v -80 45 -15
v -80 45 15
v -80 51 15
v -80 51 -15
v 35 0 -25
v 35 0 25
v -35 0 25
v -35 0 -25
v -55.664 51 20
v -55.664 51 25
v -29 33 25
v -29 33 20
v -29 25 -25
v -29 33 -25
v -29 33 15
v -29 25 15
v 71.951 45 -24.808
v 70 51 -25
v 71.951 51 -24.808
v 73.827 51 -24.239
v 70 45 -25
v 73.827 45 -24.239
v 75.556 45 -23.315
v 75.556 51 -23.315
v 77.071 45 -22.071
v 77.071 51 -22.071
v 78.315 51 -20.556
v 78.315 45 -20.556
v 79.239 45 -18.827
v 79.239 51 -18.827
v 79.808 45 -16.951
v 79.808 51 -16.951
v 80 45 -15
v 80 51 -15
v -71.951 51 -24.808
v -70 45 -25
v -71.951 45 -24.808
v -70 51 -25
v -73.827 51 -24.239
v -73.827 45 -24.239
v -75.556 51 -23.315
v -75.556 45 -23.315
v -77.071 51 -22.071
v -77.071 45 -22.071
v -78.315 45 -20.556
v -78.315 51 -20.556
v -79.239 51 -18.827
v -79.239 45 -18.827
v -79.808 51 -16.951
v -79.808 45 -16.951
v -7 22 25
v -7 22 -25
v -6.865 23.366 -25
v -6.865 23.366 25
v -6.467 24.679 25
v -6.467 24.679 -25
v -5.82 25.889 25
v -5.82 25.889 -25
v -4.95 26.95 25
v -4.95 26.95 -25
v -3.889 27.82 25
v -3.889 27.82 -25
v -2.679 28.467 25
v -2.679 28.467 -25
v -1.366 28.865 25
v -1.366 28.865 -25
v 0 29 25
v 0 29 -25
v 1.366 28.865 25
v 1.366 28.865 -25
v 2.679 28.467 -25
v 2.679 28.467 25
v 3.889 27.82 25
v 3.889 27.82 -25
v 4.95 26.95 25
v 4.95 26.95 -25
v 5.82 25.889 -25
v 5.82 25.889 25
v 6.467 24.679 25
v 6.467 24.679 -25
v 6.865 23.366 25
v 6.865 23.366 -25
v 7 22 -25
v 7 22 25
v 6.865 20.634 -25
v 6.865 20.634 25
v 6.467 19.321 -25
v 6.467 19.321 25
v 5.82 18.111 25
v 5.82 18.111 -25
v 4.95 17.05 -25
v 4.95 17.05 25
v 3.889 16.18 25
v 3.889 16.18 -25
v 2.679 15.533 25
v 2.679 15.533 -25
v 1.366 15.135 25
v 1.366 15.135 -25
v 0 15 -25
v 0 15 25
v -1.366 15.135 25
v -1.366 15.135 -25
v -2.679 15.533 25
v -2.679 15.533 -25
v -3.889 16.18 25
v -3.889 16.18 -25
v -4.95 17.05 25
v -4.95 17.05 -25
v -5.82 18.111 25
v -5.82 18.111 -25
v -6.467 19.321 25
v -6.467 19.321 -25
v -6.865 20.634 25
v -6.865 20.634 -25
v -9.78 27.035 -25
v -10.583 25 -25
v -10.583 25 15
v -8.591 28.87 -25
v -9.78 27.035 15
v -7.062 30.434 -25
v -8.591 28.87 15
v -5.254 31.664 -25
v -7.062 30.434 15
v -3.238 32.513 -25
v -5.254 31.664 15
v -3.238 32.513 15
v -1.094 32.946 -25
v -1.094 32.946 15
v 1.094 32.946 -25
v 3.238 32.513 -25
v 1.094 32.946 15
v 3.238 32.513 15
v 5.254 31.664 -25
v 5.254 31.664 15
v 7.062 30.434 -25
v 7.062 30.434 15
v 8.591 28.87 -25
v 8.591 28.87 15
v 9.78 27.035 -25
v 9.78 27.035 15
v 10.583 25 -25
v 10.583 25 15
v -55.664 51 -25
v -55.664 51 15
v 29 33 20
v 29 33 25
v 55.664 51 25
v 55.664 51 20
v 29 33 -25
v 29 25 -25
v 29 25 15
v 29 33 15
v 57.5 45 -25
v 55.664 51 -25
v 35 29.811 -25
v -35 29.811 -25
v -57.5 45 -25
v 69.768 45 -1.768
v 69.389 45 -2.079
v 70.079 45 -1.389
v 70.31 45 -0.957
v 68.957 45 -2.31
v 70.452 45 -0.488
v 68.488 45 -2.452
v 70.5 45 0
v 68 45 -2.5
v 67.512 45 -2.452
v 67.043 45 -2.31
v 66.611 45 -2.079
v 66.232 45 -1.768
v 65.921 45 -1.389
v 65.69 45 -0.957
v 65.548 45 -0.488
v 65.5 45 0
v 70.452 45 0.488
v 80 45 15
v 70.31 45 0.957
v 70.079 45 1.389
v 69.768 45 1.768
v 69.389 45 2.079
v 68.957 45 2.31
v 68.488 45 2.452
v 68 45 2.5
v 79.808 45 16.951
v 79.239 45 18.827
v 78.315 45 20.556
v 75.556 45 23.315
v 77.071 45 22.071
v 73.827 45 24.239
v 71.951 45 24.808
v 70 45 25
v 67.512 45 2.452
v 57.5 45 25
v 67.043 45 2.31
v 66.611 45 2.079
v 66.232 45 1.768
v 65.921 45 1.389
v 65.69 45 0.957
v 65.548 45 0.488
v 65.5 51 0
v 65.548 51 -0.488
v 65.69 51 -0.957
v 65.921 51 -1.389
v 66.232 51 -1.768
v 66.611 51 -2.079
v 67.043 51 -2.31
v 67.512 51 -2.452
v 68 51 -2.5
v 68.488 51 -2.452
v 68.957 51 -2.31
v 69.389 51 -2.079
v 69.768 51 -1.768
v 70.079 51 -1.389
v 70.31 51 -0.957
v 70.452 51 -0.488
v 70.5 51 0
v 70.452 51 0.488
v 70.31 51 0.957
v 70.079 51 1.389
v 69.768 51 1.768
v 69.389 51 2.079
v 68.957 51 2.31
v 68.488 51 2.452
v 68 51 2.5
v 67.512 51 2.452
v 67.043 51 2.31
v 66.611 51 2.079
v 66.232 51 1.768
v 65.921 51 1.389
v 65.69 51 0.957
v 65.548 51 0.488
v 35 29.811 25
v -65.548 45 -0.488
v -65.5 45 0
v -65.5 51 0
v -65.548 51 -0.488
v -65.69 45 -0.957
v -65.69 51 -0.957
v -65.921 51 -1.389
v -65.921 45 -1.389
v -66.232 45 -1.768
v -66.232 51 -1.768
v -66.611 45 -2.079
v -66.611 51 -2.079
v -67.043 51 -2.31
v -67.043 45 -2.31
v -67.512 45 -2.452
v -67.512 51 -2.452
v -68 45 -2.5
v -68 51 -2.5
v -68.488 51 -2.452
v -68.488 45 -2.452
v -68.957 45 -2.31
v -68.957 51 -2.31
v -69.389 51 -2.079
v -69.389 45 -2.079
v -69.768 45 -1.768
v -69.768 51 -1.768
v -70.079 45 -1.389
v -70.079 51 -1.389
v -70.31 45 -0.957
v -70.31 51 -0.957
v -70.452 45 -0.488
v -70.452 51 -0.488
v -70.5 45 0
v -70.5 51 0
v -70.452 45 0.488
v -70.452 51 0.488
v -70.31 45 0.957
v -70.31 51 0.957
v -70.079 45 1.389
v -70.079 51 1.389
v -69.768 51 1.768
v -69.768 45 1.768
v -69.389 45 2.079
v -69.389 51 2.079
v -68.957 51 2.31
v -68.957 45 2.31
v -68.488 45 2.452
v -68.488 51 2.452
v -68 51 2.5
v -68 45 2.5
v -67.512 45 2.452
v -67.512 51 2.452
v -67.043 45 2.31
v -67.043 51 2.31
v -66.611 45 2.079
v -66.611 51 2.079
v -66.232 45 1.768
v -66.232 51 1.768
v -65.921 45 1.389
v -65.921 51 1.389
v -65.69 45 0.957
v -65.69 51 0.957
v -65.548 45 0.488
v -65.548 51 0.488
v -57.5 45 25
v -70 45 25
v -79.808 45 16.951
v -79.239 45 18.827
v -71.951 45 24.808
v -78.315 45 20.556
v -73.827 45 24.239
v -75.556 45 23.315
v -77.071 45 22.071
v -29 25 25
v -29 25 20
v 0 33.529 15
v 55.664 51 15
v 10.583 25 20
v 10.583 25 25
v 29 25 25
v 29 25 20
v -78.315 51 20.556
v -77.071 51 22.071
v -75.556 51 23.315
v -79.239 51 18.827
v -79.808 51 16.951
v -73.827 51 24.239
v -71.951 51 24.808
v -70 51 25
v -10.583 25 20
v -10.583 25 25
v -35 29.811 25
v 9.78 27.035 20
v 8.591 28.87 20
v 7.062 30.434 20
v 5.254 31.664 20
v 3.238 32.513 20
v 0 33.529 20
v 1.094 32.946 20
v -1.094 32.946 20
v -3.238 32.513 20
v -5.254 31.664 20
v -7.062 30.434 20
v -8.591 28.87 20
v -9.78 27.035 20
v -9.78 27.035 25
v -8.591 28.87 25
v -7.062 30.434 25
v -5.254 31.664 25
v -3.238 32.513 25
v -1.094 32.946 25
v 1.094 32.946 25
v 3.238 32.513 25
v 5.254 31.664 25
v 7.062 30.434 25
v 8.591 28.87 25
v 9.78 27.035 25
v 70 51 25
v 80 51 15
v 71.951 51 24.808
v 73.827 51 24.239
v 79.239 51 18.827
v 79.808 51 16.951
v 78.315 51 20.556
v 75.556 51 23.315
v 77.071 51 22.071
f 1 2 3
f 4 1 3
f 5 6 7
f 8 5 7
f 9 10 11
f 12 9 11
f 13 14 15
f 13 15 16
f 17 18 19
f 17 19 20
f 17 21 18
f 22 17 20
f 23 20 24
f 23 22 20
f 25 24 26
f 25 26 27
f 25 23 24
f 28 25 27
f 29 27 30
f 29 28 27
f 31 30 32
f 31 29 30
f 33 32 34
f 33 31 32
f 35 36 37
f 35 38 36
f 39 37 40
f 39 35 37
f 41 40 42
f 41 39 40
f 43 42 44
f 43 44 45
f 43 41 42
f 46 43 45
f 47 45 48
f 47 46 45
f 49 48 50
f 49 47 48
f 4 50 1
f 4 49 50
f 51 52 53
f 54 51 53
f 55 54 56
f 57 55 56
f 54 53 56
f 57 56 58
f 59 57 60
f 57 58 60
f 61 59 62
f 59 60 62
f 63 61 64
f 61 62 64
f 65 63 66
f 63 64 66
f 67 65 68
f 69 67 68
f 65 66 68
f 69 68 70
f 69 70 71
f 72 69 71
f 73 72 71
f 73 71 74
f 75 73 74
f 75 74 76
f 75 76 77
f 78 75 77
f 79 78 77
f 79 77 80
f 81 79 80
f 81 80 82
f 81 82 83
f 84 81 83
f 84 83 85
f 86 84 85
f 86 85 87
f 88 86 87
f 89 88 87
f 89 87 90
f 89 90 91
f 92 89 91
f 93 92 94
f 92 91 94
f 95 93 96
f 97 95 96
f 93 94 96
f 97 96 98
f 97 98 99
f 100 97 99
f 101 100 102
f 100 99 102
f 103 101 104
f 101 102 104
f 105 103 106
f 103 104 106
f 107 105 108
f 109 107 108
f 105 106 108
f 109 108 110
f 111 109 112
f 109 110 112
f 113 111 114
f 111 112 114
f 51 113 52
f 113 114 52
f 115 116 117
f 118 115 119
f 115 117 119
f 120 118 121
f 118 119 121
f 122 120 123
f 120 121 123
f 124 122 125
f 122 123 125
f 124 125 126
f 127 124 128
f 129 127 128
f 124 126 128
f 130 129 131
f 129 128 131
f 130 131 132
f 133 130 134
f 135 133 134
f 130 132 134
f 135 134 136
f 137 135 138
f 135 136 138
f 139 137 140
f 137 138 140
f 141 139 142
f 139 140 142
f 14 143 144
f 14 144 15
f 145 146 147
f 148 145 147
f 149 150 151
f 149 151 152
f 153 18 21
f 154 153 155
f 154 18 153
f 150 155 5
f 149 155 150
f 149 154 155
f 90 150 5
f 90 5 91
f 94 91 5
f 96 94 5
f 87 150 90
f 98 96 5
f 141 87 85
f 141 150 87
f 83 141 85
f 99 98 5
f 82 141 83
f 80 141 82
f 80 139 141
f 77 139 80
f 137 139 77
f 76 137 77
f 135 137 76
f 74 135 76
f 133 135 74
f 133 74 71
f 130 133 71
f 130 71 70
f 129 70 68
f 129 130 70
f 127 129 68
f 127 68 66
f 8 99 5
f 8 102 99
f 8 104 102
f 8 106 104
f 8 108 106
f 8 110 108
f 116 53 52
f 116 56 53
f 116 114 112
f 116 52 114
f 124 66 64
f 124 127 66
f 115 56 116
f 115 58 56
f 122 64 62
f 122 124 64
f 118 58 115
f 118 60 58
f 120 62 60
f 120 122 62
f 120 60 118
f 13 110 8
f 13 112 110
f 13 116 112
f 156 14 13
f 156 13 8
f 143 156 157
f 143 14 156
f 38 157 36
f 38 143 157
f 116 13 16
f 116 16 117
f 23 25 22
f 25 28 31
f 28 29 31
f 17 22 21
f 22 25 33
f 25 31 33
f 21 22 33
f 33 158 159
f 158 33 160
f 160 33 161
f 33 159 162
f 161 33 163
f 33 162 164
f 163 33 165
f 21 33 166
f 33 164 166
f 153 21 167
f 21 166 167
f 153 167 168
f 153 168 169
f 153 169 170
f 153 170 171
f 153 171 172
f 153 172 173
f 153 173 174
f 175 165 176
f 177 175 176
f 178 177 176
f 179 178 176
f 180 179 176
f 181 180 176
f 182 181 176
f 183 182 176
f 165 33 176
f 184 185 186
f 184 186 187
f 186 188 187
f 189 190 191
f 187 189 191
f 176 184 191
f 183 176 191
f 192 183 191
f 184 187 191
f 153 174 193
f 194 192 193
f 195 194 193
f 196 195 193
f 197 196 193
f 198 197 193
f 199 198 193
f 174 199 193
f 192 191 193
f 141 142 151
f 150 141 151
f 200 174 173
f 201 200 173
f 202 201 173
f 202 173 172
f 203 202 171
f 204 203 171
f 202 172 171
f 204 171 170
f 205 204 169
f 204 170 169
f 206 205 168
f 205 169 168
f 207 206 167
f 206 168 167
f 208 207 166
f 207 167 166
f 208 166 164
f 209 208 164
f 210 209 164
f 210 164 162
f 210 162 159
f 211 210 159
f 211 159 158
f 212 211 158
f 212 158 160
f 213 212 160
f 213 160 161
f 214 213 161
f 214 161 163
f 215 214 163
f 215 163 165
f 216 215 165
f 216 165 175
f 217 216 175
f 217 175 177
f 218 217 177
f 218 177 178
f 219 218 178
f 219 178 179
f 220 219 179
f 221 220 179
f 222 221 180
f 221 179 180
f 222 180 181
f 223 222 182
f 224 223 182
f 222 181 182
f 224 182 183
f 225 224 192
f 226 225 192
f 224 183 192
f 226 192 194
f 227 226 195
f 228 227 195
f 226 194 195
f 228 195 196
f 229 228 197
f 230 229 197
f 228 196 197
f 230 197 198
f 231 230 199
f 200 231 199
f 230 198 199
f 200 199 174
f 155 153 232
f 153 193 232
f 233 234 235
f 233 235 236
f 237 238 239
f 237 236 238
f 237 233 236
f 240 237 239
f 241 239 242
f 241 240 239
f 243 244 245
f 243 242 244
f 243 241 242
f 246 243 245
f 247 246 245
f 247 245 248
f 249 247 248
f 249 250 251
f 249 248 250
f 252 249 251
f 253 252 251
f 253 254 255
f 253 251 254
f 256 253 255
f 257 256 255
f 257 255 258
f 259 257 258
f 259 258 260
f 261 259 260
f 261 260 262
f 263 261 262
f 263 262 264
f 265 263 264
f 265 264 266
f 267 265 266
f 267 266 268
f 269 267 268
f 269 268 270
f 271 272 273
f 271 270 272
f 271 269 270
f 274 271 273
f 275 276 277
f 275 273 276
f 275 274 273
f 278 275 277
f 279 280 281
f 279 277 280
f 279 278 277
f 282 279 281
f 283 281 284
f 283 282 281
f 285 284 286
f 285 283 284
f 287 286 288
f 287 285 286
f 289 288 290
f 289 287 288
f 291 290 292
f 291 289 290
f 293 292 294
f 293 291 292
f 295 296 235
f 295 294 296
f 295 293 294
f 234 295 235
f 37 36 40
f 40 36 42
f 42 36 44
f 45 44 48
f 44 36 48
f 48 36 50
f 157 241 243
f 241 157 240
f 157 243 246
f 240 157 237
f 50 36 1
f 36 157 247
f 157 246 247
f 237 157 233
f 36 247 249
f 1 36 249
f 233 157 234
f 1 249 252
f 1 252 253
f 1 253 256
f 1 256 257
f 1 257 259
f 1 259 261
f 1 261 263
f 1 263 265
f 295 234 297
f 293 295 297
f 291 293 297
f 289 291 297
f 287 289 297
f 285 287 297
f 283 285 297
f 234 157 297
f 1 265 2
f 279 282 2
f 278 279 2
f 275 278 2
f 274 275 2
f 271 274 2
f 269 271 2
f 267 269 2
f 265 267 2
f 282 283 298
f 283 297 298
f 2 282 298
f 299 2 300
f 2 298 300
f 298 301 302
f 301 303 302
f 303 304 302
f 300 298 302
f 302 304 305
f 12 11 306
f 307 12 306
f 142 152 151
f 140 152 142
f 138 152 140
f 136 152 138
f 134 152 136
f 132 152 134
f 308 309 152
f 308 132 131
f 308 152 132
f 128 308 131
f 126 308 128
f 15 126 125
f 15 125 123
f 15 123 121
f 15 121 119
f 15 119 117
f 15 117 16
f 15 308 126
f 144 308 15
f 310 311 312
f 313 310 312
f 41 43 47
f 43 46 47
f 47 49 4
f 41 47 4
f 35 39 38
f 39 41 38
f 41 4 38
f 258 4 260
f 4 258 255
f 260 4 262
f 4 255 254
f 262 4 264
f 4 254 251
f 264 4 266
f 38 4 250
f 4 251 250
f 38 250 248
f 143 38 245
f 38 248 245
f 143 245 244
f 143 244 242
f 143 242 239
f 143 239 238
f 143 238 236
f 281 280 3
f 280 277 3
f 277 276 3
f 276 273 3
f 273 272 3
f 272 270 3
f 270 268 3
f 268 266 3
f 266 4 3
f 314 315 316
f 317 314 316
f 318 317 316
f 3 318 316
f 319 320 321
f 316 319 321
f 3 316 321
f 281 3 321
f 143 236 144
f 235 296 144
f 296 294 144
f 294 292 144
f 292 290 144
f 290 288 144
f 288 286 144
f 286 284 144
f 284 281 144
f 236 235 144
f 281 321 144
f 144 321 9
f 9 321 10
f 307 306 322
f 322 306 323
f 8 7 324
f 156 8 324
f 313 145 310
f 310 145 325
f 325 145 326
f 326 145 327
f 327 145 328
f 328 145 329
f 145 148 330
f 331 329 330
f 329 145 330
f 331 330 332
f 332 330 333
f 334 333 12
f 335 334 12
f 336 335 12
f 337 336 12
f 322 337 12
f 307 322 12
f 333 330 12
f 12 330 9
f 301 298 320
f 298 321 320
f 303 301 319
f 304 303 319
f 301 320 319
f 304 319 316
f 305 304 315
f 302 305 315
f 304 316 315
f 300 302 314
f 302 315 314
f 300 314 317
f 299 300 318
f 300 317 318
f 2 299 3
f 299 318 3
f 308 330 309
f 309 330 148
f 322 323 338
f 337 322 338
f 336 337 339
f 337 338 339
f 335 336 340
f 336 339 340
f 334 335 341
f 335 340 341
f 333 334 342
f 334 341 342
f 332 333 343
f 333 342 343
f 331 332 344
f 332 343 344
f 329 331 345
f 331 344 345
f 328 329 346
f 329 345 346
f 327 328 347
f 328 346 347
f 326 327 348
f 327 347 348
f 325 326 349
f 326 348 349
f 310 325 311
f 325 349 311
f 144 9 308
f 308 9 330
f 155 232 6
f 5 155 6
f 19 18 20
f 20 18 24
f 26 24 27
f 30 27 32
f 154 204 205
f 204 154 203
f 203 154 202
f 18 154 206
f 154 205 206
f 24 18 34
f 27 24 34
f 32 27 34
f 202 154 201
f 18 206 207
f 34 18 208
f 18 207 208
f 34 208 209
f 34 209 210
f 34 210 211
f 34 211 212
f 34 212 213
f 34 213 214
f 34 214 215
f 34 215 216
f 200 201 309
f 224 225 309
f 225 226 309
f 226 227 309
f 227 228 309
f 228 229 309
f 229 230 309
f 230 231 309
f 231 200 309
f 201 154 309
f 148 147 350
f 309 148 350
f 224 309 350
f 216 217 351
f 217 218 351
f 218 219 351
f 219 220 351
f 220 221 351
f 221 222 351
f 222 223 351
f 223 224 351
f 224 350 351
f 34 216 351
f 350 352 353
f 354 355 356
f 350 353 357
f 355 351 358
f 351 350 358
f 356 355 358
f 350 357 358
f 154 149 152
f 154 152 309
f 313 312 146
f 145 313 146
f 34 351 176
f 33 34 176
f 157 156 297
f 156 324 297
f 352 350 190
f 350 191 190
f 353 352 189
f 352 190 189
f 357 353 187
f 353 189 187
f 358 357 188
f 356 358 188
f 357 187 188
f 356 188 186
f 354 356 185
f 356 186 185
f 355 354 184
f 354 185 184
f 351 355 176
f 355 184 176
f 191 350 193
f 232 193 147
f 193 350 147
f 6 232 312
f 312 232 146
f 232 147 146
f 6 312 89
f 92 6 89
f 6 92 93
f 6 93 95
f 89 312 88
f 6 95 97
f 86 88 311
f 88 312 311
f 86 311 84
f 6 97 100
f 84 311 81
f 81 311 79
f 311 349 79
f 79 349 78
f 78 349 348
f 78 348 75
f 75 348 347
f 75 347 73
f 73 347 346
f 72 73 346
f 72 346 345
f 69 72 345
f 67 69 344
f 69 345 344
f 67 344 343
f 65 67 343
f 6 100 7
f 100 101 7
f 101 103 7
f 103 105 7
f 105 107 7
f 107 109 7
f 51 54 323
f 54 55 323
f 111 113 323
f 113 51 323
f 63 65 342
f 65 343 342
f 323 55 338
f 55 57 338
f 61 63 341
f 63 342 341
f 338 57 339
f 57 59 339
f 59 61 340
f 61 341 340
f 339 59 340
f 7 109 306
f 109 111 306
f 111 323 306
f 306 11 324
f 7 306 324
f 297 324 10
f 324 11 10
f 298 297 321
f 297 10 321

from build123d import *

# Parameters (mm, degrees)
BOSS_EXTRUDE1_DEPTH = 25
BOSS_EXTRUDE3_START = -5
BOSS_EXTRUDE3_DEPTH = 5
HOLE1_D             = 14
HOLE2_D             = 5
FILLET1_R           = 10


with BuildPart() as part:
    # Sketch1 → Boss-Extrude1 (new, symmetric)
    with BuildSketch(Plane.XY):
        with BuildLine():
            Line((-35, 0), (-35, 29.811196065))
            Line((-35, 29.811196065), (-57.5, 45))
            Line((-57.5, 45), (-80, 45))
            Line((-80, 45), (-80, 51))
            Line((-80, 51), (-55.664377376, 51))
            Line((-55.664377376, 51), (-29, 33))
            Line((-29, 33), (-29, 25))
            Line((-29, 25), (-10.583005244, 25))
            ThreePointArc((-10.583005244, 25), (0, 33), (10.583005244, 25))
            Line((10.583005244, 25), (29, 25))
            Line((29, 25), (29, 33))
            Line((29, 33), (55.664377376, 51))
            Line((55.664377376, 51), (80, 51))
            Line((80, 51), (80, 45))
            Line((80, 45), (57.5, 45))
            Line((57.5, 45), (35, 29.811196065))
            Line((35, 29.811196065), (35, 0))
            Line((35, 0), (-35, 0))
        make_face()
    extrude(amount=BOSS_EXTRUDE1_DEPTH, both=True)

    # Sketch2 → Boss-Extrude3 (add)
    with BuildSketch(Plane.XY.offset(25).offset(BOSS_EXTRUDE3_START)):
        with BuildLine():
            Line((55.664377376, 51), (29, 33))
            Line((29, 33), (29, 25))
            Line((29, 25), (10.583005244, 25))
            ThreePointArc((10.583005244, 25), (0, 33), (-10.583005244, 25))
            Line((-10.583005244, 25), (-29, 25))
            Line((-29, 25), (-29, 33))
            Line((-29, 33), (-55.664377376, 51))
            Line((-55.664377376, 51), (0, 33.529077086))
            Line((0, 33.529077086), (55.664377376, 51))
        make_face()
    extrude(amount=-BOSS_EXTRUDE3_DEPTH)

    # Hole1 (through all)
    with Locations(Plane.XY.offset(25)):
        with Locations((0, 22)):
            Hole(HOLE1_D / 2)

    # Hole2 (through all)
    with Locations(Plane(origin=(0, 51, 0), x_dir=(1, 0, 0), z_dir=(0, 1, 0))):
        with Locations((68, 0)):
            hole2 = Hole(HOLE2_D / 2)

    # Mirror1: Hole2 across plane
    add(hole2.mirror(Plane(origin=(0, 0, 0), x_dir=(0, 0, 1), z_dir=(1, 0, 0))), mode=Mode.SUBTRACT)

    # Fillet1
    fillet1_edges = [part.edges().sort_by_distance(p)[0] for p in [
        (-80, 48, -25),
        (80, 48, 25),
        (80, 48, -25),
        (-80, 48, 25),
    ]]
    fillet(fillet1_edges, radius=FILLET1_R)


solid = part.part
